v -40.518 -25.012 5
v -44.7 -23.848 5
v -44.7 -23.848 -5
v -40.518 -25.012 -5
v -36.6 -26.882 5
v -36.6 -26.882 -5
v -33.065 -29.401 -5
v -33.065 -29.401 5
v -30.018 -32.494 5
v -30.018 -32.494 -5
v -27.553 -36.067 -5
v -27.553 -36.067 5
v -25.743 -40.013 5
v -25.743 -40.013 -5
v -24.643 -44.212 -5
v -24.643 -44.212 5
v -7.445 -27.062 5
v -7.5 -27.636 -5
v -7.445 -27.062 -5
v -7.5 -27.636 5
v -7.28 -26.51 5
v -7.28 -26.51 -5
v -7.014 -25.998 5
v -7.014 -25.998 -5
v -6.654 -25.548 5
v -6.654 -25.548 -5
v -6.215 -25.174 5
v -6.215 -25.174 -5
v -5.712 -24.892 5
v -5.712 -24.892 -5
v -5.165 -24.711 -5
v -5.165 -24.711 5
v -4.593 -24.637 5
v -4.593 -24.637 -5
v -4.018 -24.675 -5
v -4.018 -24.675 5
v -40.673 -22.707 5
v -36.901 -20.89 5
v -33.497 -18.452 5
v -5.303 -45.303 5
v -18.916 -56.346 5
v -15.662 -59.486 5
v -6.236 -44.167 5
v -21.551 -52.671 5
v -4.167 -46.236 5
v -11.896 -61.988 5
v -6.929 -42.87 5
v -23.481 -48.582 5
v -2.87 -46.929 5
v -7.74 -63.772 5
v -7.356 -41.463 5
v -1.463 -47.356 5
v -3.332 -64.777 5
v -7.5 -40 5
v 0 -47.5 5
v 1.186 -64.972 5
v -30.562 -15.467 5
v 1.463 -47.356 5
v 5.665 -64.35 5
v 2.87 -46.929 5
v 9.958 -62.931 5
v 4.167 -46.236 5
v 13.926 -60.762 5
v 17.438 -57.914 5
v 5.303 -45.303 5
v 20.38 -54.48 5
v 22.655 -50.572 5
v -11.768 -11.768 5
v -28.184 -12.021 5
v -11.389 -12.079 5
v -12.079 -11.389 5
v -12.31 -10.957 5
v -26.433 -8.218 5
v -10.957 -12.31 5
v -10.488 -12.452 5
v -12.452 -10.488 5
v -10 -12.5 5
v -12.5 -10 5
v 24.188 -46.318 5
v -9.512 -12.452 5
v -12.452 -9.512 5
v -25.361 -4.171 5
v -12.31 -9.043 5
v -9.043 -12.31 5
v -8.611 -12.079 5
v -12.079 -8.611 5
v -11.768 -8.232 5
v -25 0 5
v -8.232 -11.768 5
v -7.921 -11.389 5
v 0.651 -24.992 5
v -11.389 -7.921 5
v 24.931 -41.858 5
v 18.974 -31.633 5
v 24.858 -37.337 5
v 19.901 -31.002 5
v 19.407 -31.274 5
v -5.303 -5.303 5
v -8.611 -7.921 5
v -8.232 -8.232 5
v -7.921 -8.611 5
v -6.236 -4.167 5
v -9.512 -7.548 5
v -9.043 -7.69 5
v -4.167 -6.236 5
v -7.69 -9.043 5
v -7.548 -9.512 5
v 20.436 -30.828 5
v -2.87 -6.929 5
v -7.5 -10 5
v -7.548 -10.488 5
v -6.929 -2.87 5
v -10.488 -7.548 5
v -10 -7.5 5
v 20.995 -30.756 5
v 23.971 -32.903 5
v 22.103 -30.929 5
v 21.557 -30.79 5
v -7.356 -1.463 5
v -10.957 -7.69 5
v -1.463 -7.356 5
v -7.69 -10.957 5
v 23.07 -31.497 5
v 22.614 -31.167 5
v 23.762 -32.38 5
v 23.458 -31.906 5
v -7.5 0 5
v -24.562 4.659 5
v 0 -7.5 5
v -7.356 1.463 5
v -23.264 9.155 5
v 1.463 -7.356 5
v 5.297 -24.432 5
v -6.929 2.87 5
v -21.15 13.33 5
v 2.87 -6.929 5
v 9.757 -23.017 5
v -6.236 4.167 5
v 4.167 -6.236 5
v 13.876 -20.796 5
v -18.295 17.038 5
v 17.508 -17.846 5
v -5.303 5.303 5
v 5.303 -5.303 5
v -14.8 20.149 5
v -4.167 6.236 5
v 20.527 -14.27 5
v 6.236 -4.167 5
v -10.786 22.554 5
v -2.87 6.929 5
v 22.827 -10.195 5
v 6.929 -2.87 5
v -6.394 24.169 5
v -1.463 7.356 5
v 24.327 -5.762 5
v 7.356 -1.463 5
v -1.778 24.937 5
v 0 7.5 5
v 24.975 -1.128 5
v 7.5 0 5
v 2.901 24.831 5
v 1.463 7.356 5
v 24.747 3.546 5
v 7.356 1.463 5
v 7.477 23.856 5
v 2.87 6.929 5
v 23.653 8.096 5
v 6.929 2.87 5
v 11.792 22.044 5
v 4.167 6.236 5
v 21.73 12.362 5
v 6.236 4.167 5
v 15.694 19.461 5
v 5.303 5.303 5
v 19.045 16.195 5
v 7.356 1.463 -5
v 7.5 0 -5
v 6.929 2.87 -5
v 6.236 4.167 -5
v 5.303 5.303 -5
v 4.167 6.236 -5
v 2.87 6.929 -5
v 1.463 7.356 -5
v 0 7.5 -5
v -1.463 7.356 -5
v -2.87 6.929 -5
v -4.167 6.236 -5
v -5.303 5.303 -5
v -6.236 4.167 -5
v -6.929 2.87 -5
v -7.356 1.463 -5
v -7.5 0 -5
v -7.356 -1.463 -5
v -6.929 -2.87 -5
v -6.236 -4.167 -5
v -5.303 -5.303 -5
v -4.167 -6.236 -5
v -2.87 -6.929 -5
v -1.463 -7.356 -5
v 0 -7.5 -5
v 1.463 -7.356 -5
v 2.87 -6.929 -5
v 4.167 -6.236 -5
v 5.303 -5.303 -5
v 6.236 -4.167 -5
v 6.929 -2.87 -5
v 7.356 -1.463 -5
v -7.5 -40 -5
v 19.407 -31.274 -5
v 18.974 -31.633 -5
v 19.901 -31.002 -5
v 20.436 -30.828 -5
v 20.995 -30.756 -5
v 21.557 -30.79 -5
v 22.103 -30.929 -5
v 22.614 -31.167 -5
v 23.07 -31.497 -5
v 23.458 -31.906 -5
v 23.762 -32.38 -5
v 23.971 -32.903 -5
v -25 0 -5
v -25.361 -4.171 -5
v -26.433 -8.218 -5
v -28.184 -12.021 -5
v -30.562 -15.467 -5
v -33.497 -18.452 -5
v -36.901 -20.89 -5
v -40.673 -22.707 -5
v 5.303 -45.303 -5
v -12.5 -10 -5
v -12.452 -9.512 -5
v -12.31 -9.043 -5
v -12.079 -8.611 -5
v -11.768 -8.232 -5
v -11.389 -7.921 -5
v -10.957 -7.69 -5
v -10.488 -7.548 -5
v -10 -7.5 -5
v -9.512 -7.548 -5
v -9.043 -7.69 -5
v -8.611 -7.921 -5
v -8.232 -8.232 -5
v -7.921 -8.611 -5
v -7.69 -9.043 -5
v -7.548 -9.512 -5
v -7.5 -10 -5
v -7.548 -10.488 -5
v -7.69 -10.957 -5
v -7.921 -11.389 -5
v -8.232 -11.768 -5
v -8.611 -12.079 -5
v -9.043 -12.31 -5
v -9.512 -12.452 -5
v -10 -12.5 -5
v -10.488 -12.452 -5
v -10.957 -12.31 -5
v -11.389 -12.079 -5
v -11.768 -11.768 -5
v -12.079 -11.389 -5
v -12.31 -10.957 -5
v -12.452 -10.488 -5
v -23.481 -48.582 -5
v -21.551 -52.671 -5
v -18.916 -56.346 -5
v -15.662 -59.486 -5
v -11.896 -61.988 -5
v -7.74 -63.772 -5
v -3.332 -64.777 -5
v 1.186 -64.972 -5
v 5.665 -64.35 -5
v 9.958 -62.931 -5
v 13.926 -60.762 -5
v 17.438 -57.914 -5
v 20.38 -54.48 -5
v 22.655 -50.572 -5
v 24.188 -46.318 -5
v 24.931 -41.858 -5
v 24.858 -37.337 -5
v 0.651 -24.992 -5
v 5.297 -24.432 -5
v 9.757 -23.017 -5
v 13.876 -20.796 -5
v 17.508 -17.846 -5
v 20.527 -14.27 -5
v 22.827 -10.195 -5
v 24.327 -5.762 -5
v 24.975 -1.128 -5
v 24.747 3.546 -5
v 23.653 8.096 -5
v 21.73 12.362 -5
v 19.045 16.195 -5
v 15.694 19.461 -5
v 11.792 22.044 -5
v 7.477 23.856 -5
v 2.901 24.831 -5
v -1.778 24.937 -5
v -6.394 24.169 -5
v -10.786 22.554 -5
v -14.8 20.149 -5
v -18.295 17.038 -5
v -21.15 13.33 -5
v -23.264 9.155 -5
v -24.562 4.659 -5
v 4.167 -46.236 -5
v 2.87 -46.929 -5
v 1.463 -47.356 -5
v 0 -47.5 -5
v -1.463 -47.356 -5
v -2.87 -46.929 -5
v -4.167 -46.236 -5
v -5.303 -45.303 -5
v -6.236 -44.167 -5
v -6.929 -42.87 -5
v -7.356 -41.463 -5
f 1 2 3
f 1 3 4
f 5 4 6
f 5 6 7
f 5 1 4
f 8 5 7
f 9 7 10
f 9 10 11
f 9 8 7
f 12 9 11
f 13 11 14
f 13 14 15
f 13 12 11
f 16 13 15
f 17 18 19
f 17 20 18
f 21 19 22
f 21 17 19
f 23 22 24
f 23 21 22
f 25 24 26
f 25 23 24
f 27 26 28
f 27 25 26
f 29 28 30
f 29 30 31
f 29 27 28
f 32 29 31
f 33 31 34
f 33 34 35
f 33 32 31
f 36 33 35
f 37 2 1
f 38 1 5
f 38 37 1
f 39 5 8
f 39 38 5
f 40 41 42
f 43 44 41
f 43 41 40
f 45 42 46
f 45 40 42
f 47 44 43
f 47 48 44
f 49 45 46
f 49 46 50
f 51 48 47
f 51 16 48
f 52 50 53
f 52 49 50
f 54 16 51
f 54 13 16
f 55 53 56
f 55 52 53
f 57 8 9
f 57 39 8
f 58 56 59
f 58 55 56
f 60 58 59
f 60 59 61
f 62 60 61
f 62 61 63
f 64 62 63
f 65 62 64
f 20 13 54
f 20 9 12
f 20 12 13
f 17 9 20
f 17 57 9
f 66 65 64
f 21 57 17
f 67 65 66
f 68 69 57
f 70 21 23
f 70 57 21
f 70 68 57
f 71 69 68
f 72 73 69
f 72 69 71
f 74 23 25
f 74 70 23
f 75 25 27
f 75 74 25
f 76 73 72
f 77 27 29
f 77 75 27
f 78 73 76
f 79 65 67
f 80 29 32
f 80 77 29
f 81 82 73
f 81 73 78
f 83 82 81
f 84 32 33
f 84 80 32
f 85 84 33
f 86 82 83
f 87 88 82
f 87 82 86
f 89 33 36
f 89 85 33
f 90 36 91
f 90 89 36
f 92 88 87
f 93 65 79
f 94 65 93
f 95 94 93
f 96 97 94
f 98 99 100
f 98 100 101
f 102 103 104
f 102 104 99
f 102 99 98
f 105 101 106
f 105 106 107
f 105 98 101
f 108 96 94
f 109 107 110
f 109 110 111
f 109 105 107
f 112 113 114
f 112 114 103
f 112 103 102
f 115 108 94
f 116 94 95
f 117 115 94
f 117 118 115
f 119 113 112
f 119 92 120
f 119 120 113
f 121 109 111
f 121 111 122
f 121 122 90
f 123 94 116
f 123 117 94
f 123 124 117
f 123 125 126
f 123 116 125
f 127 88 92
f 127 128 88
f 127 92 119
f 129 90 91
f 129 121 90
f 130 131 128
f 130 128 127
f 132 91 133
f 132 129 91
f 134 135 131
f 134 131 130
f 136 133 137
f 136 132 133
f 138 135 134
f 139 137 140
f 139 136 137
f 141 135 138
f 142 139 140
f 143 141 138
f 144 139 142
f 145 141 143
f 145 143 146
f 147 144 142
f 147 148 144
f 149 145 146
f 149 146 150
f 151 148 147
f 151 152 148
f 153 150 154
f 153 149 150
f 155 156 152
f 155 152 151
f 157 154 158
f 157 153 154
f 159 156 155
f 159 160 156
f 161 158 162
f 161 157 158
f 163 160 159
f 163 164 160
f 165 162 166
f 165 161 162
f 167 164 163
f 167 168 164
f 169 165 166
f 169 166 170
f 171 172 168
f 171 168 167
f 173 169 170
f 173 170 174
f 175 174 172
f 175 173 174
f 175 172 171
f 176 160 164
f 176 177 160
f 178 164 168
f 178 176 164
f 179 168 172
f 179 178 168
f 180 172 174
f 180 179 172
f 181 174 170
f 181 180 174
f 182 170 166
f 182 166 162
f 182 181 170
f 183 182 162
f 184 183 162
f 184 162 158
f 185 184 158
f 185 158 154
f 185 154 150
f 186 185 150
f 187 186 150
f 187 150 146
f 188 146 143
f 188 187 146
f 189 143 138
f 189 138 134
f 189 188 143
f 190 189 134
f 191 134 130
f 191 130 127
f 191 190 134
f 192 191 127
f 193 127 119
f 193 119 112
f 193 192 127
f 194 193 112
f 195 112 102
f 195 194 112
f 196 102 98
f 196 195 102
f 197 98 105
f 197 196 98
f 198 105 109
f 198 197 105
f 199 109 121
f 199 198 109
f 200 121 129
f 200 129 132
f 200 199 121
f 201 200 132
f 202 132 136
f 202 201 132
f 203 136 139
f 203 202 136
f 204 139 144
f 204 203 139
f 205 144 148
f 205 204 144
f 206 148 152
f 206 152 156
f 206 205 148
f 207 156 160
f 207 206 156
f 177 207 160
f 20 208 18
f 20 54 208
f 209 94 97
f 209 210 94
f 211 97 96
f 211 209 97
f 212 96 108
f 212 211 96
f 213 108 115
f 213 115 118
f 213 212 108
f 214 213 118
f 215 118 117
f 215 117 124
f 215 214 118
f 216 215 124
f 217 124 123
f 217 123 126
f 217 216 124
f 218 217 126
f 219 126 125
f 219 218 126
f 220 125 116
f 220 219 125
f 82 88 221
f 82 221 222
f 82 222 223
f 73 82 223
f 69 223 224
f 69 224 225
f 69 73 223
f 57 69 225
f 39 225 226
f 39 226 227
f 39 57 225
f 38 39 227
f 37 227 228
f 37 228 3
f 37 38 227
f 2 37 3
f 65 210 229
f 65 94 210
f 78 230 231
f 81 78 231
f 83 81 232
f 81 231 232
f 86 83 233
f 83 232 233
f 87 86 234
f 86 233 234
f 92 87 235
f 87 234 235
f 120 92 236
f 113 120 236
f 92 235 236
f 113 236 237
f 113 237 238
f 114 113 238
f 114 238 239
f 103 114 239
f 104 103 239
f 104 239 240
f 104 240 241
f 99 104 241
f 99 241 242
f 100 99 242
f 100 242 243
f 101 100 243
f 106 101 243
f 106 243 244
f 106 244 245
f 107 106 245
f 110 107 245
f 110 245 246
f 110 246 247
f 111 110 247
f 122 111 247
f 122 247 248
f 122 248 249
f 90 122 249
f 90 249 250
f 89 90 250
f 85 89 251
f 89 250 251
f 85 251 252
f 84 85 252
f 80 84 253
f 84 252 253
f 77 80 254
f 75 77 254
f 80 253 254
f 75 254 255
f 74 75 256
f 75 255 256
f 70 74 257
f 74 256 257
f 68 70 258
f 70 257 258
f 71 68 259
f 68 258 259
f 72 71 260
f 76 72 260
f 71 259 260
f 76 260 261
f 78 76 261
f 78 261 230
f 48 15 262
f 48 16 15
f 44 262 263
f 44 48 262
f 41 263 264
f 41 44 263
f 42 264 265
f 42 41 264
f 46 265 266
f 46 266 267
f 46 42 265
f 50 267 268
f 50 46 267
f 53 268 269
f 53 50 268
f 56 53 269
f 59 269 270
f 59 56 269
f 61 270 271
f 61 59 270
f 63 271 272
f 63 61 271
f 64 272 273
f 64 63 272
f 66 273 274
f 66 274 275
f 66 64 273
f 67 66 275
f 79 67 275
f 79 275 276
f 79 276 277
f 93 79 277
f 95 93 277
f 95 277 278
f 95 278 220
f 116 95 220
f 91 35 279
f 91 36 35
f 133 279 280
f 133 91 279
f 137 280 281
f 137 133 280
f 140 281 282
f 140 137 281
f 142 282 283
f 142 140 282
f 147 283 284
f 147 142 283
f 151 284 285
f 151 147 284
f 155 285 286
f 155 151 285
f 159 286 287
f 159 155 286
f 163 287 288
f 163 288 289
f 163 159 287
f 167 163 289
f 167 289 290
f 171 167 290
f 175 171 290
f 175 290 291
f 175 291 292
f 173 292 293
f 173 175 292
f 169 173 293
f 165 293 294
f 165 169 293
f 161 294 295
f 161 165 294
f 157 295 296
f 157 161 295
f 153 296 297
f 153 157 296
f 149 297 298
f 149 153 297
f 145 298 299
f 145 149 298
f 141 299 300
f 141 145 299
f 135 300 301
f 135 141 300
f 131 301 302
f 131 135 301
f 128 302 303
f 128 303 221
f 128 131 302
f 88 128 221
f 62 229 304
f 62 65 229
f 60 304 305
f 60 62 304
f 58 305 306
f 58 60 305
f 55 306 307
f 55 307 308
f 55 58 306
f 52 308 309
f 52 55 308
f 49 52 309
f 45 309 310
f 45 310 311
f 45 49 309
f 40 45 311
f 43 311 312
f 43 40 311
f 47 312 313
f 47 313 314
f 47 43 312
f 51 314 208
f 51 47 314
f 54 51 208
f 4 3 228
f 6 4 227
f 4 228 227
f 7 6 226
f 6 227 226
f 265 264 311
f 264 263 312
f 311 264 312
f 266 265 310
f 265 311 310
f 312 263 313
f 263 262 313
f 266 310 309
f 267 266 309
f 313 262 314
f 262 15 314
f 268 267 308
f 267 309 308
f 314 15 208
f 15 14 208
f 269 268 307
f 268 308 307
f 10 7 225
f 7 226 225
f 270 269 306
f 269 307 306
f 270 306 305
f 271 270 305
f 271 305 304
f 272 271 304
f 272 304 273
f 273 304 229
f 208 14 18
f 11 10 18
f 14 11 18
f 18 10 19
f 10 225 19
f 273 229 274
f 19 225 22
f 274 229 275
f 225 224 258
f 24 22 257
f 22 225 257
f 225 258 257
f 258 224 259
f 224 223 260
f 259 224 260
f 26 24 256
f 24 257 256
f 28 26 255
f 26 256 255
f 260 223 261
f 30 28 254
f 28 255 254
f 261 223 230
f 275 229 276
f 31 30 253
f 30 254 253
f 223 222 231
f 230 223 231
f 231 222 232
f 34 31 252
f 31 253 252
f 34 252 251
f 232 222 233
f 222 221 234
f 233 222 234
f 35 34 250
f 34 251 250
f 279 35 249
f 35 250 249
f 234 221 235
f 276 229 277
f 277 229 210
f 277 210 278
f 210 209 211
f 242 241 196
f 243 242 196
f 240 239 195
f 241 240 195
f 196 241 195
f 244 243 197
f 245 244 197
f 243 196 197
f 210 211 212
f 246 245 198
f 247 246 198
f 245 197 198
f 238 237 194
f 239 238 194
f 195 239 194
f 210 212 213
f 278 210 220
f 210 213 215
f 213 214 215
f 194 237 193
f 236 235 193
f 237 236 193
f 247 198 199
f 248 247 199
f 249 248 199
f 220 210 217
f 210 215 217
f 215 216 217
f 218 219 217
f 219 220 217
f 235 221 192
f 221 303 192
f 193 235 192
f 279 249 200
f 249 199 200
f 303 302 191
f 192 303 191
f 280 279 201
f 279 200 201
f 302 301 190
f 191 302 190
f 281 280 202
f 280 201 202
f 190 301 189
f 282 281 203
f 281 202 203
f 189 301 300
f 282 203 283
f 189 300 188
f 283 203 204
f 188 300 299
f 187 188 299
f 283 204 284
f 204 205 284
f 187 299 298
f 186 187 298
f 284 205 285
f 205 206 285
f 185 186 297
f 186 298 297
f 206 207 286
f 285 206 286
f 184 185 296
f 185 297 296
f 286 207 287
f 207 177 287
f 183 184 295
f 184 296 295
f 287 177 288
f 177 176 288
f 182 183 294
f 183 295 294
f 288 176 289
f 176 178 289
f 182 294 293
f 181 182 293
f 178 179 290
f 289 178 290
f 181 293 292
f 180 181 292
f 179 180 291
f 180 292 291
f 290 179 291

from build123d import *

# Parameters (mm, degrees)
F0_R     = 7.5
F1_DEPTH = 5
F2_R     = 3
F5_D     = 5


with BuildPart() as f1:
    # F0 (on Top) → F1 (new body, symmetric)
    with BuildSketch(Plane.XY):
        with BuildLine():
            Line((-7.5, -40), (-7.5, -23.84848))
            ThreePointArc((-7.5, -23.84848), (20.155644, 14.790199), (-25, 0))
            ThreePointArc((-25, 0), (-30.562061, -15.466566), (-44.700474, -23.84848))
            ThreePointArc((-44.700474, -23.84848), (-31.474239, -30.881099), (-24.642584, -44.212248))
            ThreePointArc((-24.642584, -44.212248), (7.982755, -63.691256), (22.166723, -28.439879))
            Line((22.166723, -28.439879), (5.303301, -45.303301))
            ThreePointArc((5.303301, -45.303301), (-2.870126, -46.929096), (-7.5, -40))
        make_face()
        Circle(F0_R, mode=Mode.SUBTRACT)
    extrude(amount=F1_DEPTH, both=True)

    # F2
    f2_edges = [f1.edges().sort_by_distance(p)[0] for p in [
        (22.166723, -28.439879, 0),
        (-7.5, -23.84848, 0),
    ]]
    fillet(f2_edges, radius=F2_R)

    # F5 (through all)
    with Locations(Plane.XY):
        with Locations((-10, -10)):
            Hole(F5_D / 2)


solid = f1.part
